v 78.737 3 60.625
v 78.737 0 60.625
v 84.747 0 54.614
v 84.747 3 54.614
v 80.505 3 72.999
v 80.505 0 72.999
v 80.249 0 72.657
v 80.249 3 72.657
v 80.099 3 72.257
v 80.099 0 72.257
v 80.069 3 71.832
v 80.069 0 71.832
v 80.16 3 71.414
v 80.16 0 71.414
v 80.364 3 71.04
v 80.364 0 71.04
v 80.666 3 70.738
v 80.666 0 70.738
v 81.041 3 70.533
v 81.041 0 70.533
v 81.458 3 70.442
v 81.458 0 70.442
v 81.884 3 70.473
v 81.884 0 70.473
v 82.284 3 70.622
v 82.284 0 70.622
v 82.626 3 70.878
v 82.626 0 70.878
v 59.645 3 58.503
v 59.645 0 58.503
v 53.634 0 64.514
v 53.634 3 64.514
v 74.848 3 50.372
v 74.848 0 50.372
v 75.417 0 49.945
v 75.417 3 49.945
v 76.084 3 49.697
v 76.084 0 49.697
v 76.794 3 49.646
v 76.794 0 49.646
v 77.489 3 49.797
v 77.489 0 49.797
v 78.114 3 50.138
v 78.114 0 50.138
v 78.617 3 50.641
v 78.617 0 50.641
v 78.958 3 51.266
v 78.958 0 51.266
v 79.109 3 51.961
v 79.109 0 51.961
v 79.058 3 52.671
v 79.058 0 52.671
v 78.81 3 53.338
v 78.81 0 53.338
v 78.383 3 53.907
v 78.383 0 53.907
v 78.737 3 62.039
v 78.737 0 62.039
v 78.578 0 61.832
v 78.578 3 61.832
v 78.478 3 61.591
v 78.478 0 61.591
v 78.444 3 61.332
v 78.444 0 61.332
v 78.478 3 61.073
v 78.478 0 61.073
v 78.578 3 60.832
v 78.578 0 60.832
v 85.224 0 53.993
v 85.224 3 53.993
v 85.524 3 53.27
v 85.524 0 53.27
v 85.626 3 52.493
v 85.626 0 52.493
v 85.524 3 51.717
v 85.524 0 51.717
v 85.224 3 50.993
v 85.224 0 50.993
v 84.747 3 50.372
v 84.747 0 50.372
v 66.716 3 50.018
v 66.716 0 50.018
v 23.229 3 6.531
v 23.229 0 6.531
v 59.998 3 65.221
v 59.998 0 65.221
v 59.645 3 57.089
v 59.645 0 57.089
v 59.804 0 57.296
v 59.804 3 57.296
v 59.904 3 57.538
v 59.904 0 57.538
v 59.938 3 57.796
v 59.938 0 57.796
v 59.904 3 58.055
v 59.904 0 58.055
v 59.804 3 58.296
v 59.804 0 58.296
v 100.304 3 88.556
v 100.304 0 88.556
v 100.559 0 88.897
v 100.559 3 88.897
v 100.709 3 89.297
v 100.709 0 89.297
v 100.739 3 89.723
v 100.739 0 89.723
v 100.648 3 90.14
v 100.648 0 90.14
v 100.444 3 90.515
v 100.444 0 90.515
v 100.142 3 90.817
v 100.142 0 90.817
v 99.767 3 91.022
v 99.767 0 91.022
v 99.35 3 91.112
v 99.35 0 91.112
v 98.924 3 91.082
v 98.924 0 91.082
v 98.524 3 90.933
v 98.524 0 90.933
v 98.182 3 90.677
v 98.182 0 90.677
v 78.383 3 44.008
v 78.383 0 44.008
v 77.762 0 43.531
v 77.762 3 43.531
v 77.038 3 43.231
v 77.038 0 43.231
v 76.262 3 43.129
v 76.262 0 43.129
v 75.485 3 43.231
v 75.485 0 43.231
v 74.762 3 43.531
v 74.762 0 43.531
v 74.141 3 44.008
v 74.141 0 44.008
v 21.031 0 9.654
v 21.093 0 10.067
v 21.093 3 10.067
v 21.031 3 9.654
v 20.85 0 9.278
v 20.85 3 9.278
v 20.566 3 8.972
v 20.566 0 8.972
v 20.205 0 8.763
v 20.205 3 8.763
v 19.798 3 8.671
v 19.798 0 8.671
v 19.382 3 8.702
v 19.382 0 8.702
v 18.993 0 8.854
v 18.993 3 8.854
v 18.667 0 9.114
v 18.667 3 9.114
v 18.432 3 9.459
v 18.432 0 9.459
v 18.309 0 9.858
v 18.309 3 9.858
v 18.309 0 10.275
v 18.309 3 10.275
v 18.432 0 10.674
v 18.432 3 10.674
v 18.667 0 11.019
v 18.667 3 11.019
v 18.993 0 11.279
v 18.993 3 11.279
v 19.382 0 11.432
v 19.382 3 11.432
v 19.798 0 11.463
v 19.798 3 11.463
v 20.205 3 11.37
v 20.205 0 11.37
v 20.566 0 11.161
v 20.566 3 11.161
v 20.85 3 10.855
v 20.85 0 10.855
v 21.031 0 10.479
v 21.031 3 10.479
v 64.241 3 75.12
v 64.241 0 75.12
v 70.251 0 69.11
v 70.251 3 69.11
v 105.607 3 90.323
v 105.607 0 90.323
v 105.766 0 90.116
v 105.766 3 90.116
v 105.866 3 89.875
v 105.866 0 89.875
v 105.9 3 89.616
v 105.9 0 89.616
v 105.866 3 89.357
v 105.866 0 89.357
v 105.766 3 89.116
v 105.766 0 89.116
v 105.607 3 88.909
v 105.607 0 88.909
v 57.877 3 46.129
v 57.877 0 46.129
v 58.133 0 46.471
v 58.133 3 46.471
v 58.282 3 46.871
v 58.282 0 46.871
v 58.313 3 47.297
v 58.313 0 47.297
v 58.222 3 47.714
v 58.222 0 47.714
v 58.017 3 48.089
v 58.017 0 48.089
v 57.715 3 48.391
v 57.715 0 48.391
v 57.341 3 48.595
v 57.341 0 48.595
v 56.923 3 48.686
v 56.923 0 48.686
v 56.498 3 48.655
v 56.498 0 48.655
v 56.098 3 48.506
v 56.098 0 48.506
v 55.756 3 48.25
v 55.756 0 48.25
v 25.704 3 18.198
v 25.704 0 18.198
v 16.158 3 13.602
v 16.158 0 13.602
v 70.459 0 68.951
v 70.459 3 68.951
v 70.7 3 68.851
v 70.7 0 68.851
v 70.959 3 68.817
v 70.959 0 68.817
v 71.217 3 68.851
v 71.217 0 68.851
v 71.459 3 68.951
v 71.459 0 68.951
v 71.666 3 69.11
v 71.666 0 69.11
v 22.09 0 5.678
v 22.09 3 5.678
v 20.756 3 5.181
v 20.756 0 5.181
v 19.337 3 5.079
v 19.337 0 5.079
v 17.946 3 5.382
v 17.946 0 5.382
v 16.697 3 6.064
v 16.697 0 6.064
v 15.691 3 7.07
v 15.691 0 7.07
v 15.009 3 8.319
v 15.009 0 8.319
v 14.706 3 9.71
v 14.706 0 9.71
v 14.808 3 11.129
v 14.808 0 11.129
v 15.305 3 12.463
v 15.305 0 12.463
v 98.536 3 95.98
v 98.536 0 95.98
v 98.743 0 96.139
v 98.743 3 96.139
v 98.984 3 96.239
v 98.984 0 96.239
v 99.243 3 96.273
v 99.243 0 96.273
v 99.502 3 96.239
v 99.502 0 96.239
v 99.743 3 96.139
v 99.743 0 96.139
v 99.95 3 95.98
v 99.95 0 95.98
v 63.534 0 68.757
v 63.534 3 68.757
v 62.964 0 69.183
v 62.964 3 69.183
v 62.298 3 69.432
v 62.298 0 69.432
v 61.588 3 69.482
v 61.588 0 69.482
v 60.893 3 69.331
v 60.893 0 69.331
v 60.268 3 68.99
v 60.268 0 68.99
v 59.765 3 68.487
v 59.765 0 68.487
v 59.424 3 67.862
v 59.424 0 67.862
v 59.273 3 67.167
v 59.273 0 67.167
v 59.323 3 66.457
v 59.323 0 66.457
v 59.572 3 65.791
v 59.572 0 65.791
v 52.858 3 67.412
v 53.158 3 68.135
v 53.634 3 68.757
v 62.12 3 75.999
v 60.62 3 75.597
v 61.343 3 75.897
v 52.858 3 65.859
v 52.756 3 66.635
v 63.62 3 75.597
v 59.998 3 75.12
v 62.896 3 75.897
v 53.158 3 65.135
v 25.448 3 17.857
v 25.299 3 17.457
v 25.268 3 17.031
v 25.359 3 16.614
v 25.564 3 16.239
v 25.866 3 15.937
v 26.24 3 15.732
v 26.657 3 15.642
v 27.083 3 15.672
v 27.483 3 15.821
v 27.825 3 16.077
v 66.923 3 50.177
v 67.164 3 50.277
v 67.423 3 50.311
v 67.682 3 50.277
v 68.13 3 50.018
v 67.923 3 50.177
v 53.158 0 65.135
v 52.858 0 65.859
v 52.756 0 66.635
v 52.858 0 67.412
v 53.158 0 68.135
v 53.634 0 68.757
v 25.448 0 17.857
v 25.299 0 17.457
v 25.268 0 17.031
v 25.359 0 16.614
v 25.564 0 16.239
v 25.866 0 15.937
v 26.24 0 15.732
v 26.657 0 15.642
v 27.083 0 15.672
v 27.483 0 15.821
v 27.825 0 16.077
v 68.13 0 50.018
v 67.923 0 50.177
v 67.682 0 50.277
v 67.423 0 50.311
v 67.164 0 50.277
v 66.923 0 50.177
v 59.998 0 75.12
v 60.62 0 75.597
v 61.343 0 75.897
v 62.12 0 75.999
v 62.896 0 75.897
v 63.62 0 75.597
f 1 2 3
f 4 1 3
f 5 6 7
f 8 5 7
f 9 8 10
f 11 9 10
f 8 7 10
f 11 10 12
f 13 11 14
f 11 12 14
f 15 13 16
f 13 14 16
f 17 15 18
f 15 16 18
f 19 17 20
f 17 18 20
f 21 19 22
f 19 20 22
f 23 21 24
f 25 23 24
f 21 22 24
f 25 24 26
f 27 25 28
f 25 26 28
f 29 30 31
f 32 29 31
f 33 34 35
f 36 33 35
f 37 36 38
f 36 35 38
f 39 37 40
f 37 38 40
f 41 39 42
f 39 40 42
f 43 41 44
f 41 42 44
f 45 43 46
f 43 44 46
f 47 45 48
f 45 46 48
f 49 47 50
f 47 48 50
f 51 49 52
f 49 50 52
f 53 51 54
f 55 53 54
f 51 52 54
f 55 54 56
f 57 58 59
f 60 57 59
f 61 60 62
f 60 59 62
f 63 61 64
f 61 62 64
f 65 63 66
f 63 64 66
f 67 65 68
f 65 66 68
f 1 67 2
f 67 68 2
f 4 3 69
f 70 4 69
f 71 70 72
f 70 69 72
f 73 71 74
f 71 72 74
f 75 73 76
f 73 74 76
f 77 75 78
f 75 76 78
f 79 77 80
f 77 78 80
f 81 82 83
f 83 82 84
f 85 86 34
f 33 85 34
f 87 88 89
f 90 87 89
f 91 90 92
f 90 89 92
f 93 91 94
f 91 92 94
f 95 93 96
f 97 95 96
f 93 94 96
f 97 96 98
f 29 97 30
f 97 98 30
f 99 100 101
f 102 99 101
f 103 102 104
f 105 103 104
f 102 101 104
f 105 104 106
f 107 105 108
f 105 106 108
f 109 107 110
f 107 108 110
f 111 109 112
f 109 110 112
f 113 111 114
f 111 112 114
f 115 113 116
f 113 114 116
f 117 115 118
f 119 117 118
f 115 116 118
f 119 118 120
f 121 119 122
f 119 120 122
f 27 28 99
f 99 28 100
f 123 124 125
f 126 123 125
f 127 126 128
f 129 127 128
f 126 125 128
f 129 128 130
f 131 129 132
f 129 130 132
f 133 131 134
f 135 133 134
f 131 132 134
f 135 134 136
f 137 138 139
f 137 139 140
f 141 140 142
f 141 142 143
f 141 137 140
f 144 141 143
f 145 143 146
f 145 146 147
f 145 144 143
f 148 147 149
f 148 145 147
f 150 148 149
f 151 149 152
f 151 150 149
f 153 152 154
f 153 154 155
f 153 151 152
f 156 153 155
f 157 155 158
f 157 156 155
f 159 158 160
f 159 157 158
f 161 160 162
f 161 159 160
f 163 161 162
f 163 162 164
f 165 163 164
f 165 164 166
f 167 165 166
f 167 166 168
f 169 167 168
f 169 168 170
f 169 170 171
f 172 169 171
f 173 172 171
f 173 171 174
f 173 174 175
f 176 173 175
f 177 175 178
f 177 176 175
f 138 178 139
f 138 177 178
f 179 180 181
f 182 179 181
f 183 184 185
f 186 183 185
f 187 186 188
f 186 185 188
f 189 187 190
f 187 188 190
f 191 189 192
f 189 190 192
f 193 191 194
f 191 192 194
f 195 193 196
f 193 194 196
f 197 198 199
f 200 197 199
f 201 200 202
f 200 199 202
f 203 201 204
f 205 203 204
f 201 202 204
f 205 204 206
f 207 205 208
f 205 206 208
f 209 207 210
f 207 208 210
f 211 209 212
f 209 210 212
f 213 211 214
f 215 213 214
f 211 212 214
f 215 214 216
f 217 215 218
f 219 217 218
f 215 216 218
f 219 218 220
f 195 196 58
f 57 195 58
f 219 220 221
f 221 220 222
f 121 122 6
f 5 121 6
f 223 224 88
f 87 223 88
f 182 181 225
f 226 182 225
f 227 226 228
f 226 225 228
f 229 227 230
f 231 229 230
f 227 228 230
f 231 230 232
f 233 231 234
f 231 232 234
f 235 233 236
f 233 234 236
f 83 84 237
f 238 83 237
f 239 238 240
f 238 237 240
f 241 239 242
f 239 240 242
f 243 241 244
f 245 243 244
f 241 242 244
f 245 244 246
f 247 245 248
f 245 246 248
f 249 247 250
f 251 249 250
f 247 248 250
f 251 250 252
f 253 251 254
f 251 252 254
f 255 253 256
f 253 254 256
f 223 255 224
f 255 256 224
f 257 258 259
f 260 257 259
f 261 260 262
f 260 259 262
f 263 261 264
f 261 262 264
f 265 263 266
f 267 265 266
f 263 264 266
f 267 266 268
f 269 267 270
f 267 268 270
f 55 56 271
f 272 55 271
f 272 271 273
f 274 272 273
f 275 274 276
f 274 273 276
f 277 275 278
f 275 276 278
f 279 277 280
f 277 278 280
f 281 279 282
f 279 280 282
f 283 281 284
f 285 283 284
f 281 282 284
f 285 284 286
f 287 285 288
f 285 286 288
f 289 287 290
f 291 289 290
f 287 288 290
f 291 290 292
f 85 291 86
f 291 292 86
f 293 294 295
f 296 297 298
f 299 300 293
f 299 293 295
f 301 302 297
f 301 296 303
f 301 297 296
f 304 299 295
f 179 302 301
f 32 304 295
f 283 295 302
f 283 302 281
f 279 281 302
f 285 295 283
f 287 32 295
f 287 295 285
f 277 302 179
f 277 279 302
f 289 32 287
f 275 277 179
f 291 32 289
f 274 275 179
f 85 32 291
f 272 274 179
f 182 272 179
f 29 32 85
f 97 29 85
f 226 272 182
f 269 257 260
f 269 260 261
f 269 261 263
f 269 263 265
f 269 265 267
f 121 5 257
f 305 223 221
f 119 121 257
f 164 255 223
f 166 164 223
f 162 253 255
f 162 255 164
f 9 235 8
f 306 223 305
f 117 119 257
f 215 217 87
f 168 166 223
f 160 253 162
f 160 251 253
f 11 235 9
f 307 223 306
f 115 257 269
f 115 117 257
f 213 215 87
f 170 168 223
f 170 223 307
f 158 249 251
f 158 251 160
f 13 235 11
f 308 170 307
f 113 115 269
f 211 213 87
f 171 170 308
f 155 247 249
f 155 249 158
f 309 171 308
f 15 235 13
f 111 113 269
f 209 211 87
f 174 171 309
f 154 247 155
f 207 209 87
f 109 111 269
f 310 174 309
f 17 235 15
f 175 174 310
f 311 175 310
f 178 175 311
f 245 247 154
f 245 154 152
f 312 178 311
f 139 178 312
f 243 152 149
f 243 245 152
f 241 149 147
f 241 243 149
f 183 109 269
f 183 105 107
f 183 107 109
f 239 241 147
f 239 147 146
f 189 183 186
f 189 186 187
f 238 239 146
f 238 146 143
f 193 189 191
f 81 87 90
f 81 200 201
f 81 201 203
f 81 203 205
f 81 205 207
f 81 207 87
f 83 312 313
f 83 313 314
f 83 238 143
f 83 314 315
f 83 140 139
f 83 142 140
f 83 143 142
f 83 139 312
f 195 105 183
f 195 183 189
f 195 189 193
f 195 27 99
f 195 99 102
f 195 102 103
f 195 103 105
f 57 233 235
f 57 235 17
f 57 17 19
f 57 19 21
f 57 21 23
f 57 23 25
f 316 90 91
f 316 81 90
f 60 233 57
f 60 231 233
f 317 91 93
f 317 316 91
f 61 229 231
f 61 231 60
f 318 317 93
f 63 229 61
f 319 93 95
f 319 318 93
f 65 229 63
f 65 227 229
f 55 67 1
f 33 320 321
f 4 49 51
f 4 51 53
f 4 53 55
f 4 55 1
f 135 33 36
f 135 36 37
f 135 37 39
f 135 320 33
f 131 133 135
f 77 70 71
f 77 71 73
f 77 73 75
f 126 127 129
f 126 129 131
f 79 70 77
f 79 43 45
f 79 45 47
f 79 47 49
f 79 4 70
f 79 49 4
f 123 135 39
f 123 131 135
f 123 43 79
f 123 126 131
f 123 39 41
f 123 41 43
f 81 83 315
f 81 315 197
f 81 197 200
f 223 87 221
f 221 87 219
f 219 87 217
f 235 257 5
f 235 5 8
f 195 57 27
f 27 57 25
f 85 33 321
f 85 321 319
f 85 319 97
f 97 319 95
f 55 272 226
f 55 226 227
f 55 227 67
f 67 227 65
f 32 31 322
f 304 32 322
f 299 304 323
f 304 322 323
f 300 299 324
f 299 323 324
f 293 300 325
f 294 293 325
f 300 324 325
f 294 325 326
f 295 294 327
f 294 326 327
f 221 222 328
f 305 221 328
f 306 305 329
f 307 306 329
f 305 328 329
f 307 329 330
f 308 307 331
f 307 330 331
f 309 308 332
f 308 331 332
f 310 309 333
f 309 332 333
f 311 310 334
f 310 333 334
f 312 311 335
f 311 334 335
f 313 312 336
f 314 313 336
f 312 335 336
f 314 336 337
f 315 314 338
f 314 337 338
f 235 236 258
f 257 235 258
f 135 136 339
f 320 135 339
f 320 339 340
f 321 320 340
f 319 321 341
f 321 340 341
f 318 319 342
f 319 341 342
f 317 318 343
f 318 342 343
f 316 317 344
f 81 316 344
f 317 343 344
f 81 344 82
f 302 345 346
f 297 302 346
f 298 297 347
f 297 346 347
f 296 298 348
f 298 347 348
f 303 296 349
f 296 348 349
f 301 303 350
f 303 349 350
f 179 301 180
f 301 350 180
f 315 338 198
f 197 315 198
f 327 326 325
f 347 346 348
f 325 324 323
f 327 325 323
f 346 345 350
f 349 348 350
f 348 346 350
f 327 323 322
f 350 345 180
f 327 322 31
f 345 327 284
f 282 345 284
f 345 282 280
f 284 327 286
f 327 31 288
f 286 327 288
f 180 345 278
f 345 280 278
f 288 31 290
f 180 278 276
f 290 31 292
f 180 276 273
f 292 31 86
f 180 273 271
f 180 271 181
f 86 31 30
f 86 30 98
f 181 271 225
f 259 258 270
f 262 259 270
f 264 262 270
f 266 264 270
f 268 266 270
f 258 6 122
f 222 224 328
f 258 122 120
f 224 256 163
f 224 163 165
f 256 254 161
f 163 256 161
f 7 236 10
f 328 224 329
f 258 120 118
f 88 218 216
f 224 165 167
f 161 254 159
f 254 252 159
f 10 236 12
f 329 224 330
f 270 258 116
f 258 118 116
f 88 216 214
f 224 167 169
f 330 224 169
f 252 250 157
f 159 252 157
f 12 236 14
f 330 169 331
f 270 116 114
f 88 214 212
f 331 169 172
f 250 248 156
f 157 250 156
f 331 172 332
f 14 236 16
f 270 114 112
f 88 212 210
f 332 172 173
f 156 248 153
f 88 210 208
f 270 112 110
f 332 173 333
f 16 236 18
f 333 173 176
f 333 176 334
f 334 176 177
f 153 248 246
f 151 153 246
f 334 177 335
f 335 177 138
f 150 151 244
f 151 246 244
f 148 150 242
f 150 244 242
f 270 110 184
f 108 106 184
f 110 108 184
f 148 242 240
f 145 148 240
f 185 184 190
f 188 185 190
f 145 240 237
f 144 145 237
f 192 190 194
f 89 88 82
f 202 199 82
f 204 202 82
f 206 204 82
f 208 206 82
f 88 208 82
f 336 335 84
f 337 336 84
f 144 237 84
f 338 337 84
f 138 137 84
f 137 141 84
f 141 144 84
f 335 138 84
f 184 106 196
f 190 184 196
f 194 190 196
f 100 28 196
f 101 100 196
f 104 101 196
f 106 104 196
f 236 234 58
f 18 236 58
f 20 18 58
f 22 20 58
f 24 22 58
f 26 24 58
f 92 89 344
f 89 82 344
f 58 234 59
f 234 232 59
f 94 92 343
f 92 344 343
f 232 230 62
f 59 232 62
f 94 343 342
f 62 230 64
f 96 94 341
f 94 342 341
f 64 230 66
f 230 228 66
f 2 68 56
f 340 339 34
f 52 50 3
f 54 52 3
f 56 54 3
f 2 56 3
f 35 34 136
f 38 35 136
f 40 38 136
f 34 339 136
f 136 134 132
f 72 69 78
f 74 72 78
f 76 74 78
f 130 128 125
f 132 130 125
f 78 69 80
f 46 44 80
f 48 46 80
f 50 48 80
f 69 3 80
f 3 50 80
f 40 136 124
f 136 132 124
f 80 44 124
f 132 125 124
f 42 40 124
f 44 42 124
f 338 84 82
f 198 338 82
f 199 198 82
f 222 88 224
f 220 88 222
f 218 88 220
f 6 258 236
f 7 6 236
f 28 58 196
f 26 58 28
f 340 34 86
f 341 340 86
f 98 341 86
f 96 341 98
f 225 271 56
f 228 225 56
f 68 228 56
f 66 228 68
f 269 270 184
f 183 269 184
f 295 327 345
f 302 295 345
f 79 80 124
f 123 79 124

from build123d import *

# Parameters (mm, degrees)
SKETCH1_R           = 1.4
BOSS_EXTRUDE1_DEPTH = 3


with BuildPart() as part:
    # Sketch1 → Boss-Extrude1 (new body)
    with BuildSketch(Plane(origin=(0, 0, 0), x_dir=(1, 0, 0), z_dir=(0, 1, 0))):
        with BuildLine():
            Line((66.715956662, -50.018199395), (23.228889619, -6.531132352))
            ThreePointArc((23.228889619, -6.531132352), (16.157821807, -6.531132352), (16.157821807, -13.602200164))
            Line((16.157821807, -13.602200164), (59.64488885, -57.089267207))
            ThreePointArc((59.64488885, -57.089267207), (59.937782069, -57.796373988), (59.64488885, -58.503480769))
            Line((59.64488885, -58.503480769), (53.63448121, -64.513888409))
            ThreePointArc((53.63448121, -64.513888409), (52.755801554, -66.635208753), (53.63448121, -68.756529097))
            Line((53.63448121, -68.756529097), (59.998442241, -75.120490127))
            ThreePointArc((59.998442241, -75.120490127), (62.119762584, -75.999169784), (64.241082928, -75.120490127))
            Line((64.241082928, -75.120490127), (70.251490568, -69.110082487))
            ThreePointArc((70.251490568, -69.110082487), (70.958597349, -68.817189268), (71.665704131, -69.110082487))
            Line((71.665704131, -69.110082487), (98.535761816, -95.980140172))
            ThreePointArc((98.535761816, -95.980140172), (99.242868597, -96.273033391), (99.949975378, -95.980140172))
            Line((99.949975378, -95.980140172), (105.606829627, -90.323285923))
            ThreePointArc((105.606829627, -90.323285923), (105.899722846, -89.616179142), (105.606829627, -88.90907236))
            Line((105.606829627, -88.90907236), (78.736771942, -62.039014675))
            ThreePointArc((78.736771942, -62.039014675), (78.443878724, -61.331907894), (78.736771942, -60.624801113))
            Line((78.736771942, -60.624801113), (84.747179582, -54.614393473))
            ThreePointArc((84.747179582, -54.614393473), (85.625859239, -52.493073129), (84.747179582, -50.371752786))
            Line((84.747179582, -50.371752786), (78.383218552, -44.007791755))
            ThreePointArc((78.383218552, -44.007791755), (76.261898208, -43.129112099), (74.140577865, -44.007791755))
            Line((74.140577865, -44.007791755), (68.130170225, -50.018199395))
            ThreePointArc((68.130170225, -50.018199395), (67.423063443, -50.311092614), (66.715956662, -50.018199395))
        make_face()
        with Locations((19.693355713, -10.066666258)):
            Circle(SKETCH1_R, mode=Mode.SUBTRACT)
        with BuildLine():
            Line((82.625859239, -70.87784944), (100.303528769, -88.55551897))
            ThreePointArc((100.303528769, -88.55551897), (100.303528769, -90.676839313), (98.182208425, -90.676839313))
            Line((98.182208425, -90.676839313), (80.504538895, -72.999169784))
            ThreePointArc((80.504538895, -72.999169784), (80.504538895, -70.87784944), (82.625859239, -70.87784944))
        make_face(mode=Mode.SUBTRACT)
        with BuildLine():
            Line((59.998442241, -65.220995191), (74.847684646, -50.371752786))
            ThreePointArc((74.847684646, -50.371752786), (78.383218552, -50.371752786), (78.383218552, -53.907286692))
            Line((78.383218552, -53.907286692), (63.533976147, -68.756529097))
            ThreePointArc((63.533976147, -68.756529097), (59.998442241, -68.756529097), (59.998442241, -65.220995191))
        make_face(mode=Mode.SUBTRACT)
        with BuildLine():
            Line((27.825083697, -16.077073898), (57.877121897, -46.129112099))
            ThreePointArc((57.877121897, -46.129112099), (57.877121897, -48.250432442), (55.755801554, -48.250432442))
            Line((55.755801554, -48.250432442), (25.703763353, -18.198394242))
            ThreePointArc((25.703763353, -18.198394242), (25.703763353, -16.077073898), (27.825083697, -16.077073898))
        make_face(mode=Mode.SUBTRACT)
    extrude(amount=BOSS_EXTRUDE1_DEPTH)


solid = part.part
